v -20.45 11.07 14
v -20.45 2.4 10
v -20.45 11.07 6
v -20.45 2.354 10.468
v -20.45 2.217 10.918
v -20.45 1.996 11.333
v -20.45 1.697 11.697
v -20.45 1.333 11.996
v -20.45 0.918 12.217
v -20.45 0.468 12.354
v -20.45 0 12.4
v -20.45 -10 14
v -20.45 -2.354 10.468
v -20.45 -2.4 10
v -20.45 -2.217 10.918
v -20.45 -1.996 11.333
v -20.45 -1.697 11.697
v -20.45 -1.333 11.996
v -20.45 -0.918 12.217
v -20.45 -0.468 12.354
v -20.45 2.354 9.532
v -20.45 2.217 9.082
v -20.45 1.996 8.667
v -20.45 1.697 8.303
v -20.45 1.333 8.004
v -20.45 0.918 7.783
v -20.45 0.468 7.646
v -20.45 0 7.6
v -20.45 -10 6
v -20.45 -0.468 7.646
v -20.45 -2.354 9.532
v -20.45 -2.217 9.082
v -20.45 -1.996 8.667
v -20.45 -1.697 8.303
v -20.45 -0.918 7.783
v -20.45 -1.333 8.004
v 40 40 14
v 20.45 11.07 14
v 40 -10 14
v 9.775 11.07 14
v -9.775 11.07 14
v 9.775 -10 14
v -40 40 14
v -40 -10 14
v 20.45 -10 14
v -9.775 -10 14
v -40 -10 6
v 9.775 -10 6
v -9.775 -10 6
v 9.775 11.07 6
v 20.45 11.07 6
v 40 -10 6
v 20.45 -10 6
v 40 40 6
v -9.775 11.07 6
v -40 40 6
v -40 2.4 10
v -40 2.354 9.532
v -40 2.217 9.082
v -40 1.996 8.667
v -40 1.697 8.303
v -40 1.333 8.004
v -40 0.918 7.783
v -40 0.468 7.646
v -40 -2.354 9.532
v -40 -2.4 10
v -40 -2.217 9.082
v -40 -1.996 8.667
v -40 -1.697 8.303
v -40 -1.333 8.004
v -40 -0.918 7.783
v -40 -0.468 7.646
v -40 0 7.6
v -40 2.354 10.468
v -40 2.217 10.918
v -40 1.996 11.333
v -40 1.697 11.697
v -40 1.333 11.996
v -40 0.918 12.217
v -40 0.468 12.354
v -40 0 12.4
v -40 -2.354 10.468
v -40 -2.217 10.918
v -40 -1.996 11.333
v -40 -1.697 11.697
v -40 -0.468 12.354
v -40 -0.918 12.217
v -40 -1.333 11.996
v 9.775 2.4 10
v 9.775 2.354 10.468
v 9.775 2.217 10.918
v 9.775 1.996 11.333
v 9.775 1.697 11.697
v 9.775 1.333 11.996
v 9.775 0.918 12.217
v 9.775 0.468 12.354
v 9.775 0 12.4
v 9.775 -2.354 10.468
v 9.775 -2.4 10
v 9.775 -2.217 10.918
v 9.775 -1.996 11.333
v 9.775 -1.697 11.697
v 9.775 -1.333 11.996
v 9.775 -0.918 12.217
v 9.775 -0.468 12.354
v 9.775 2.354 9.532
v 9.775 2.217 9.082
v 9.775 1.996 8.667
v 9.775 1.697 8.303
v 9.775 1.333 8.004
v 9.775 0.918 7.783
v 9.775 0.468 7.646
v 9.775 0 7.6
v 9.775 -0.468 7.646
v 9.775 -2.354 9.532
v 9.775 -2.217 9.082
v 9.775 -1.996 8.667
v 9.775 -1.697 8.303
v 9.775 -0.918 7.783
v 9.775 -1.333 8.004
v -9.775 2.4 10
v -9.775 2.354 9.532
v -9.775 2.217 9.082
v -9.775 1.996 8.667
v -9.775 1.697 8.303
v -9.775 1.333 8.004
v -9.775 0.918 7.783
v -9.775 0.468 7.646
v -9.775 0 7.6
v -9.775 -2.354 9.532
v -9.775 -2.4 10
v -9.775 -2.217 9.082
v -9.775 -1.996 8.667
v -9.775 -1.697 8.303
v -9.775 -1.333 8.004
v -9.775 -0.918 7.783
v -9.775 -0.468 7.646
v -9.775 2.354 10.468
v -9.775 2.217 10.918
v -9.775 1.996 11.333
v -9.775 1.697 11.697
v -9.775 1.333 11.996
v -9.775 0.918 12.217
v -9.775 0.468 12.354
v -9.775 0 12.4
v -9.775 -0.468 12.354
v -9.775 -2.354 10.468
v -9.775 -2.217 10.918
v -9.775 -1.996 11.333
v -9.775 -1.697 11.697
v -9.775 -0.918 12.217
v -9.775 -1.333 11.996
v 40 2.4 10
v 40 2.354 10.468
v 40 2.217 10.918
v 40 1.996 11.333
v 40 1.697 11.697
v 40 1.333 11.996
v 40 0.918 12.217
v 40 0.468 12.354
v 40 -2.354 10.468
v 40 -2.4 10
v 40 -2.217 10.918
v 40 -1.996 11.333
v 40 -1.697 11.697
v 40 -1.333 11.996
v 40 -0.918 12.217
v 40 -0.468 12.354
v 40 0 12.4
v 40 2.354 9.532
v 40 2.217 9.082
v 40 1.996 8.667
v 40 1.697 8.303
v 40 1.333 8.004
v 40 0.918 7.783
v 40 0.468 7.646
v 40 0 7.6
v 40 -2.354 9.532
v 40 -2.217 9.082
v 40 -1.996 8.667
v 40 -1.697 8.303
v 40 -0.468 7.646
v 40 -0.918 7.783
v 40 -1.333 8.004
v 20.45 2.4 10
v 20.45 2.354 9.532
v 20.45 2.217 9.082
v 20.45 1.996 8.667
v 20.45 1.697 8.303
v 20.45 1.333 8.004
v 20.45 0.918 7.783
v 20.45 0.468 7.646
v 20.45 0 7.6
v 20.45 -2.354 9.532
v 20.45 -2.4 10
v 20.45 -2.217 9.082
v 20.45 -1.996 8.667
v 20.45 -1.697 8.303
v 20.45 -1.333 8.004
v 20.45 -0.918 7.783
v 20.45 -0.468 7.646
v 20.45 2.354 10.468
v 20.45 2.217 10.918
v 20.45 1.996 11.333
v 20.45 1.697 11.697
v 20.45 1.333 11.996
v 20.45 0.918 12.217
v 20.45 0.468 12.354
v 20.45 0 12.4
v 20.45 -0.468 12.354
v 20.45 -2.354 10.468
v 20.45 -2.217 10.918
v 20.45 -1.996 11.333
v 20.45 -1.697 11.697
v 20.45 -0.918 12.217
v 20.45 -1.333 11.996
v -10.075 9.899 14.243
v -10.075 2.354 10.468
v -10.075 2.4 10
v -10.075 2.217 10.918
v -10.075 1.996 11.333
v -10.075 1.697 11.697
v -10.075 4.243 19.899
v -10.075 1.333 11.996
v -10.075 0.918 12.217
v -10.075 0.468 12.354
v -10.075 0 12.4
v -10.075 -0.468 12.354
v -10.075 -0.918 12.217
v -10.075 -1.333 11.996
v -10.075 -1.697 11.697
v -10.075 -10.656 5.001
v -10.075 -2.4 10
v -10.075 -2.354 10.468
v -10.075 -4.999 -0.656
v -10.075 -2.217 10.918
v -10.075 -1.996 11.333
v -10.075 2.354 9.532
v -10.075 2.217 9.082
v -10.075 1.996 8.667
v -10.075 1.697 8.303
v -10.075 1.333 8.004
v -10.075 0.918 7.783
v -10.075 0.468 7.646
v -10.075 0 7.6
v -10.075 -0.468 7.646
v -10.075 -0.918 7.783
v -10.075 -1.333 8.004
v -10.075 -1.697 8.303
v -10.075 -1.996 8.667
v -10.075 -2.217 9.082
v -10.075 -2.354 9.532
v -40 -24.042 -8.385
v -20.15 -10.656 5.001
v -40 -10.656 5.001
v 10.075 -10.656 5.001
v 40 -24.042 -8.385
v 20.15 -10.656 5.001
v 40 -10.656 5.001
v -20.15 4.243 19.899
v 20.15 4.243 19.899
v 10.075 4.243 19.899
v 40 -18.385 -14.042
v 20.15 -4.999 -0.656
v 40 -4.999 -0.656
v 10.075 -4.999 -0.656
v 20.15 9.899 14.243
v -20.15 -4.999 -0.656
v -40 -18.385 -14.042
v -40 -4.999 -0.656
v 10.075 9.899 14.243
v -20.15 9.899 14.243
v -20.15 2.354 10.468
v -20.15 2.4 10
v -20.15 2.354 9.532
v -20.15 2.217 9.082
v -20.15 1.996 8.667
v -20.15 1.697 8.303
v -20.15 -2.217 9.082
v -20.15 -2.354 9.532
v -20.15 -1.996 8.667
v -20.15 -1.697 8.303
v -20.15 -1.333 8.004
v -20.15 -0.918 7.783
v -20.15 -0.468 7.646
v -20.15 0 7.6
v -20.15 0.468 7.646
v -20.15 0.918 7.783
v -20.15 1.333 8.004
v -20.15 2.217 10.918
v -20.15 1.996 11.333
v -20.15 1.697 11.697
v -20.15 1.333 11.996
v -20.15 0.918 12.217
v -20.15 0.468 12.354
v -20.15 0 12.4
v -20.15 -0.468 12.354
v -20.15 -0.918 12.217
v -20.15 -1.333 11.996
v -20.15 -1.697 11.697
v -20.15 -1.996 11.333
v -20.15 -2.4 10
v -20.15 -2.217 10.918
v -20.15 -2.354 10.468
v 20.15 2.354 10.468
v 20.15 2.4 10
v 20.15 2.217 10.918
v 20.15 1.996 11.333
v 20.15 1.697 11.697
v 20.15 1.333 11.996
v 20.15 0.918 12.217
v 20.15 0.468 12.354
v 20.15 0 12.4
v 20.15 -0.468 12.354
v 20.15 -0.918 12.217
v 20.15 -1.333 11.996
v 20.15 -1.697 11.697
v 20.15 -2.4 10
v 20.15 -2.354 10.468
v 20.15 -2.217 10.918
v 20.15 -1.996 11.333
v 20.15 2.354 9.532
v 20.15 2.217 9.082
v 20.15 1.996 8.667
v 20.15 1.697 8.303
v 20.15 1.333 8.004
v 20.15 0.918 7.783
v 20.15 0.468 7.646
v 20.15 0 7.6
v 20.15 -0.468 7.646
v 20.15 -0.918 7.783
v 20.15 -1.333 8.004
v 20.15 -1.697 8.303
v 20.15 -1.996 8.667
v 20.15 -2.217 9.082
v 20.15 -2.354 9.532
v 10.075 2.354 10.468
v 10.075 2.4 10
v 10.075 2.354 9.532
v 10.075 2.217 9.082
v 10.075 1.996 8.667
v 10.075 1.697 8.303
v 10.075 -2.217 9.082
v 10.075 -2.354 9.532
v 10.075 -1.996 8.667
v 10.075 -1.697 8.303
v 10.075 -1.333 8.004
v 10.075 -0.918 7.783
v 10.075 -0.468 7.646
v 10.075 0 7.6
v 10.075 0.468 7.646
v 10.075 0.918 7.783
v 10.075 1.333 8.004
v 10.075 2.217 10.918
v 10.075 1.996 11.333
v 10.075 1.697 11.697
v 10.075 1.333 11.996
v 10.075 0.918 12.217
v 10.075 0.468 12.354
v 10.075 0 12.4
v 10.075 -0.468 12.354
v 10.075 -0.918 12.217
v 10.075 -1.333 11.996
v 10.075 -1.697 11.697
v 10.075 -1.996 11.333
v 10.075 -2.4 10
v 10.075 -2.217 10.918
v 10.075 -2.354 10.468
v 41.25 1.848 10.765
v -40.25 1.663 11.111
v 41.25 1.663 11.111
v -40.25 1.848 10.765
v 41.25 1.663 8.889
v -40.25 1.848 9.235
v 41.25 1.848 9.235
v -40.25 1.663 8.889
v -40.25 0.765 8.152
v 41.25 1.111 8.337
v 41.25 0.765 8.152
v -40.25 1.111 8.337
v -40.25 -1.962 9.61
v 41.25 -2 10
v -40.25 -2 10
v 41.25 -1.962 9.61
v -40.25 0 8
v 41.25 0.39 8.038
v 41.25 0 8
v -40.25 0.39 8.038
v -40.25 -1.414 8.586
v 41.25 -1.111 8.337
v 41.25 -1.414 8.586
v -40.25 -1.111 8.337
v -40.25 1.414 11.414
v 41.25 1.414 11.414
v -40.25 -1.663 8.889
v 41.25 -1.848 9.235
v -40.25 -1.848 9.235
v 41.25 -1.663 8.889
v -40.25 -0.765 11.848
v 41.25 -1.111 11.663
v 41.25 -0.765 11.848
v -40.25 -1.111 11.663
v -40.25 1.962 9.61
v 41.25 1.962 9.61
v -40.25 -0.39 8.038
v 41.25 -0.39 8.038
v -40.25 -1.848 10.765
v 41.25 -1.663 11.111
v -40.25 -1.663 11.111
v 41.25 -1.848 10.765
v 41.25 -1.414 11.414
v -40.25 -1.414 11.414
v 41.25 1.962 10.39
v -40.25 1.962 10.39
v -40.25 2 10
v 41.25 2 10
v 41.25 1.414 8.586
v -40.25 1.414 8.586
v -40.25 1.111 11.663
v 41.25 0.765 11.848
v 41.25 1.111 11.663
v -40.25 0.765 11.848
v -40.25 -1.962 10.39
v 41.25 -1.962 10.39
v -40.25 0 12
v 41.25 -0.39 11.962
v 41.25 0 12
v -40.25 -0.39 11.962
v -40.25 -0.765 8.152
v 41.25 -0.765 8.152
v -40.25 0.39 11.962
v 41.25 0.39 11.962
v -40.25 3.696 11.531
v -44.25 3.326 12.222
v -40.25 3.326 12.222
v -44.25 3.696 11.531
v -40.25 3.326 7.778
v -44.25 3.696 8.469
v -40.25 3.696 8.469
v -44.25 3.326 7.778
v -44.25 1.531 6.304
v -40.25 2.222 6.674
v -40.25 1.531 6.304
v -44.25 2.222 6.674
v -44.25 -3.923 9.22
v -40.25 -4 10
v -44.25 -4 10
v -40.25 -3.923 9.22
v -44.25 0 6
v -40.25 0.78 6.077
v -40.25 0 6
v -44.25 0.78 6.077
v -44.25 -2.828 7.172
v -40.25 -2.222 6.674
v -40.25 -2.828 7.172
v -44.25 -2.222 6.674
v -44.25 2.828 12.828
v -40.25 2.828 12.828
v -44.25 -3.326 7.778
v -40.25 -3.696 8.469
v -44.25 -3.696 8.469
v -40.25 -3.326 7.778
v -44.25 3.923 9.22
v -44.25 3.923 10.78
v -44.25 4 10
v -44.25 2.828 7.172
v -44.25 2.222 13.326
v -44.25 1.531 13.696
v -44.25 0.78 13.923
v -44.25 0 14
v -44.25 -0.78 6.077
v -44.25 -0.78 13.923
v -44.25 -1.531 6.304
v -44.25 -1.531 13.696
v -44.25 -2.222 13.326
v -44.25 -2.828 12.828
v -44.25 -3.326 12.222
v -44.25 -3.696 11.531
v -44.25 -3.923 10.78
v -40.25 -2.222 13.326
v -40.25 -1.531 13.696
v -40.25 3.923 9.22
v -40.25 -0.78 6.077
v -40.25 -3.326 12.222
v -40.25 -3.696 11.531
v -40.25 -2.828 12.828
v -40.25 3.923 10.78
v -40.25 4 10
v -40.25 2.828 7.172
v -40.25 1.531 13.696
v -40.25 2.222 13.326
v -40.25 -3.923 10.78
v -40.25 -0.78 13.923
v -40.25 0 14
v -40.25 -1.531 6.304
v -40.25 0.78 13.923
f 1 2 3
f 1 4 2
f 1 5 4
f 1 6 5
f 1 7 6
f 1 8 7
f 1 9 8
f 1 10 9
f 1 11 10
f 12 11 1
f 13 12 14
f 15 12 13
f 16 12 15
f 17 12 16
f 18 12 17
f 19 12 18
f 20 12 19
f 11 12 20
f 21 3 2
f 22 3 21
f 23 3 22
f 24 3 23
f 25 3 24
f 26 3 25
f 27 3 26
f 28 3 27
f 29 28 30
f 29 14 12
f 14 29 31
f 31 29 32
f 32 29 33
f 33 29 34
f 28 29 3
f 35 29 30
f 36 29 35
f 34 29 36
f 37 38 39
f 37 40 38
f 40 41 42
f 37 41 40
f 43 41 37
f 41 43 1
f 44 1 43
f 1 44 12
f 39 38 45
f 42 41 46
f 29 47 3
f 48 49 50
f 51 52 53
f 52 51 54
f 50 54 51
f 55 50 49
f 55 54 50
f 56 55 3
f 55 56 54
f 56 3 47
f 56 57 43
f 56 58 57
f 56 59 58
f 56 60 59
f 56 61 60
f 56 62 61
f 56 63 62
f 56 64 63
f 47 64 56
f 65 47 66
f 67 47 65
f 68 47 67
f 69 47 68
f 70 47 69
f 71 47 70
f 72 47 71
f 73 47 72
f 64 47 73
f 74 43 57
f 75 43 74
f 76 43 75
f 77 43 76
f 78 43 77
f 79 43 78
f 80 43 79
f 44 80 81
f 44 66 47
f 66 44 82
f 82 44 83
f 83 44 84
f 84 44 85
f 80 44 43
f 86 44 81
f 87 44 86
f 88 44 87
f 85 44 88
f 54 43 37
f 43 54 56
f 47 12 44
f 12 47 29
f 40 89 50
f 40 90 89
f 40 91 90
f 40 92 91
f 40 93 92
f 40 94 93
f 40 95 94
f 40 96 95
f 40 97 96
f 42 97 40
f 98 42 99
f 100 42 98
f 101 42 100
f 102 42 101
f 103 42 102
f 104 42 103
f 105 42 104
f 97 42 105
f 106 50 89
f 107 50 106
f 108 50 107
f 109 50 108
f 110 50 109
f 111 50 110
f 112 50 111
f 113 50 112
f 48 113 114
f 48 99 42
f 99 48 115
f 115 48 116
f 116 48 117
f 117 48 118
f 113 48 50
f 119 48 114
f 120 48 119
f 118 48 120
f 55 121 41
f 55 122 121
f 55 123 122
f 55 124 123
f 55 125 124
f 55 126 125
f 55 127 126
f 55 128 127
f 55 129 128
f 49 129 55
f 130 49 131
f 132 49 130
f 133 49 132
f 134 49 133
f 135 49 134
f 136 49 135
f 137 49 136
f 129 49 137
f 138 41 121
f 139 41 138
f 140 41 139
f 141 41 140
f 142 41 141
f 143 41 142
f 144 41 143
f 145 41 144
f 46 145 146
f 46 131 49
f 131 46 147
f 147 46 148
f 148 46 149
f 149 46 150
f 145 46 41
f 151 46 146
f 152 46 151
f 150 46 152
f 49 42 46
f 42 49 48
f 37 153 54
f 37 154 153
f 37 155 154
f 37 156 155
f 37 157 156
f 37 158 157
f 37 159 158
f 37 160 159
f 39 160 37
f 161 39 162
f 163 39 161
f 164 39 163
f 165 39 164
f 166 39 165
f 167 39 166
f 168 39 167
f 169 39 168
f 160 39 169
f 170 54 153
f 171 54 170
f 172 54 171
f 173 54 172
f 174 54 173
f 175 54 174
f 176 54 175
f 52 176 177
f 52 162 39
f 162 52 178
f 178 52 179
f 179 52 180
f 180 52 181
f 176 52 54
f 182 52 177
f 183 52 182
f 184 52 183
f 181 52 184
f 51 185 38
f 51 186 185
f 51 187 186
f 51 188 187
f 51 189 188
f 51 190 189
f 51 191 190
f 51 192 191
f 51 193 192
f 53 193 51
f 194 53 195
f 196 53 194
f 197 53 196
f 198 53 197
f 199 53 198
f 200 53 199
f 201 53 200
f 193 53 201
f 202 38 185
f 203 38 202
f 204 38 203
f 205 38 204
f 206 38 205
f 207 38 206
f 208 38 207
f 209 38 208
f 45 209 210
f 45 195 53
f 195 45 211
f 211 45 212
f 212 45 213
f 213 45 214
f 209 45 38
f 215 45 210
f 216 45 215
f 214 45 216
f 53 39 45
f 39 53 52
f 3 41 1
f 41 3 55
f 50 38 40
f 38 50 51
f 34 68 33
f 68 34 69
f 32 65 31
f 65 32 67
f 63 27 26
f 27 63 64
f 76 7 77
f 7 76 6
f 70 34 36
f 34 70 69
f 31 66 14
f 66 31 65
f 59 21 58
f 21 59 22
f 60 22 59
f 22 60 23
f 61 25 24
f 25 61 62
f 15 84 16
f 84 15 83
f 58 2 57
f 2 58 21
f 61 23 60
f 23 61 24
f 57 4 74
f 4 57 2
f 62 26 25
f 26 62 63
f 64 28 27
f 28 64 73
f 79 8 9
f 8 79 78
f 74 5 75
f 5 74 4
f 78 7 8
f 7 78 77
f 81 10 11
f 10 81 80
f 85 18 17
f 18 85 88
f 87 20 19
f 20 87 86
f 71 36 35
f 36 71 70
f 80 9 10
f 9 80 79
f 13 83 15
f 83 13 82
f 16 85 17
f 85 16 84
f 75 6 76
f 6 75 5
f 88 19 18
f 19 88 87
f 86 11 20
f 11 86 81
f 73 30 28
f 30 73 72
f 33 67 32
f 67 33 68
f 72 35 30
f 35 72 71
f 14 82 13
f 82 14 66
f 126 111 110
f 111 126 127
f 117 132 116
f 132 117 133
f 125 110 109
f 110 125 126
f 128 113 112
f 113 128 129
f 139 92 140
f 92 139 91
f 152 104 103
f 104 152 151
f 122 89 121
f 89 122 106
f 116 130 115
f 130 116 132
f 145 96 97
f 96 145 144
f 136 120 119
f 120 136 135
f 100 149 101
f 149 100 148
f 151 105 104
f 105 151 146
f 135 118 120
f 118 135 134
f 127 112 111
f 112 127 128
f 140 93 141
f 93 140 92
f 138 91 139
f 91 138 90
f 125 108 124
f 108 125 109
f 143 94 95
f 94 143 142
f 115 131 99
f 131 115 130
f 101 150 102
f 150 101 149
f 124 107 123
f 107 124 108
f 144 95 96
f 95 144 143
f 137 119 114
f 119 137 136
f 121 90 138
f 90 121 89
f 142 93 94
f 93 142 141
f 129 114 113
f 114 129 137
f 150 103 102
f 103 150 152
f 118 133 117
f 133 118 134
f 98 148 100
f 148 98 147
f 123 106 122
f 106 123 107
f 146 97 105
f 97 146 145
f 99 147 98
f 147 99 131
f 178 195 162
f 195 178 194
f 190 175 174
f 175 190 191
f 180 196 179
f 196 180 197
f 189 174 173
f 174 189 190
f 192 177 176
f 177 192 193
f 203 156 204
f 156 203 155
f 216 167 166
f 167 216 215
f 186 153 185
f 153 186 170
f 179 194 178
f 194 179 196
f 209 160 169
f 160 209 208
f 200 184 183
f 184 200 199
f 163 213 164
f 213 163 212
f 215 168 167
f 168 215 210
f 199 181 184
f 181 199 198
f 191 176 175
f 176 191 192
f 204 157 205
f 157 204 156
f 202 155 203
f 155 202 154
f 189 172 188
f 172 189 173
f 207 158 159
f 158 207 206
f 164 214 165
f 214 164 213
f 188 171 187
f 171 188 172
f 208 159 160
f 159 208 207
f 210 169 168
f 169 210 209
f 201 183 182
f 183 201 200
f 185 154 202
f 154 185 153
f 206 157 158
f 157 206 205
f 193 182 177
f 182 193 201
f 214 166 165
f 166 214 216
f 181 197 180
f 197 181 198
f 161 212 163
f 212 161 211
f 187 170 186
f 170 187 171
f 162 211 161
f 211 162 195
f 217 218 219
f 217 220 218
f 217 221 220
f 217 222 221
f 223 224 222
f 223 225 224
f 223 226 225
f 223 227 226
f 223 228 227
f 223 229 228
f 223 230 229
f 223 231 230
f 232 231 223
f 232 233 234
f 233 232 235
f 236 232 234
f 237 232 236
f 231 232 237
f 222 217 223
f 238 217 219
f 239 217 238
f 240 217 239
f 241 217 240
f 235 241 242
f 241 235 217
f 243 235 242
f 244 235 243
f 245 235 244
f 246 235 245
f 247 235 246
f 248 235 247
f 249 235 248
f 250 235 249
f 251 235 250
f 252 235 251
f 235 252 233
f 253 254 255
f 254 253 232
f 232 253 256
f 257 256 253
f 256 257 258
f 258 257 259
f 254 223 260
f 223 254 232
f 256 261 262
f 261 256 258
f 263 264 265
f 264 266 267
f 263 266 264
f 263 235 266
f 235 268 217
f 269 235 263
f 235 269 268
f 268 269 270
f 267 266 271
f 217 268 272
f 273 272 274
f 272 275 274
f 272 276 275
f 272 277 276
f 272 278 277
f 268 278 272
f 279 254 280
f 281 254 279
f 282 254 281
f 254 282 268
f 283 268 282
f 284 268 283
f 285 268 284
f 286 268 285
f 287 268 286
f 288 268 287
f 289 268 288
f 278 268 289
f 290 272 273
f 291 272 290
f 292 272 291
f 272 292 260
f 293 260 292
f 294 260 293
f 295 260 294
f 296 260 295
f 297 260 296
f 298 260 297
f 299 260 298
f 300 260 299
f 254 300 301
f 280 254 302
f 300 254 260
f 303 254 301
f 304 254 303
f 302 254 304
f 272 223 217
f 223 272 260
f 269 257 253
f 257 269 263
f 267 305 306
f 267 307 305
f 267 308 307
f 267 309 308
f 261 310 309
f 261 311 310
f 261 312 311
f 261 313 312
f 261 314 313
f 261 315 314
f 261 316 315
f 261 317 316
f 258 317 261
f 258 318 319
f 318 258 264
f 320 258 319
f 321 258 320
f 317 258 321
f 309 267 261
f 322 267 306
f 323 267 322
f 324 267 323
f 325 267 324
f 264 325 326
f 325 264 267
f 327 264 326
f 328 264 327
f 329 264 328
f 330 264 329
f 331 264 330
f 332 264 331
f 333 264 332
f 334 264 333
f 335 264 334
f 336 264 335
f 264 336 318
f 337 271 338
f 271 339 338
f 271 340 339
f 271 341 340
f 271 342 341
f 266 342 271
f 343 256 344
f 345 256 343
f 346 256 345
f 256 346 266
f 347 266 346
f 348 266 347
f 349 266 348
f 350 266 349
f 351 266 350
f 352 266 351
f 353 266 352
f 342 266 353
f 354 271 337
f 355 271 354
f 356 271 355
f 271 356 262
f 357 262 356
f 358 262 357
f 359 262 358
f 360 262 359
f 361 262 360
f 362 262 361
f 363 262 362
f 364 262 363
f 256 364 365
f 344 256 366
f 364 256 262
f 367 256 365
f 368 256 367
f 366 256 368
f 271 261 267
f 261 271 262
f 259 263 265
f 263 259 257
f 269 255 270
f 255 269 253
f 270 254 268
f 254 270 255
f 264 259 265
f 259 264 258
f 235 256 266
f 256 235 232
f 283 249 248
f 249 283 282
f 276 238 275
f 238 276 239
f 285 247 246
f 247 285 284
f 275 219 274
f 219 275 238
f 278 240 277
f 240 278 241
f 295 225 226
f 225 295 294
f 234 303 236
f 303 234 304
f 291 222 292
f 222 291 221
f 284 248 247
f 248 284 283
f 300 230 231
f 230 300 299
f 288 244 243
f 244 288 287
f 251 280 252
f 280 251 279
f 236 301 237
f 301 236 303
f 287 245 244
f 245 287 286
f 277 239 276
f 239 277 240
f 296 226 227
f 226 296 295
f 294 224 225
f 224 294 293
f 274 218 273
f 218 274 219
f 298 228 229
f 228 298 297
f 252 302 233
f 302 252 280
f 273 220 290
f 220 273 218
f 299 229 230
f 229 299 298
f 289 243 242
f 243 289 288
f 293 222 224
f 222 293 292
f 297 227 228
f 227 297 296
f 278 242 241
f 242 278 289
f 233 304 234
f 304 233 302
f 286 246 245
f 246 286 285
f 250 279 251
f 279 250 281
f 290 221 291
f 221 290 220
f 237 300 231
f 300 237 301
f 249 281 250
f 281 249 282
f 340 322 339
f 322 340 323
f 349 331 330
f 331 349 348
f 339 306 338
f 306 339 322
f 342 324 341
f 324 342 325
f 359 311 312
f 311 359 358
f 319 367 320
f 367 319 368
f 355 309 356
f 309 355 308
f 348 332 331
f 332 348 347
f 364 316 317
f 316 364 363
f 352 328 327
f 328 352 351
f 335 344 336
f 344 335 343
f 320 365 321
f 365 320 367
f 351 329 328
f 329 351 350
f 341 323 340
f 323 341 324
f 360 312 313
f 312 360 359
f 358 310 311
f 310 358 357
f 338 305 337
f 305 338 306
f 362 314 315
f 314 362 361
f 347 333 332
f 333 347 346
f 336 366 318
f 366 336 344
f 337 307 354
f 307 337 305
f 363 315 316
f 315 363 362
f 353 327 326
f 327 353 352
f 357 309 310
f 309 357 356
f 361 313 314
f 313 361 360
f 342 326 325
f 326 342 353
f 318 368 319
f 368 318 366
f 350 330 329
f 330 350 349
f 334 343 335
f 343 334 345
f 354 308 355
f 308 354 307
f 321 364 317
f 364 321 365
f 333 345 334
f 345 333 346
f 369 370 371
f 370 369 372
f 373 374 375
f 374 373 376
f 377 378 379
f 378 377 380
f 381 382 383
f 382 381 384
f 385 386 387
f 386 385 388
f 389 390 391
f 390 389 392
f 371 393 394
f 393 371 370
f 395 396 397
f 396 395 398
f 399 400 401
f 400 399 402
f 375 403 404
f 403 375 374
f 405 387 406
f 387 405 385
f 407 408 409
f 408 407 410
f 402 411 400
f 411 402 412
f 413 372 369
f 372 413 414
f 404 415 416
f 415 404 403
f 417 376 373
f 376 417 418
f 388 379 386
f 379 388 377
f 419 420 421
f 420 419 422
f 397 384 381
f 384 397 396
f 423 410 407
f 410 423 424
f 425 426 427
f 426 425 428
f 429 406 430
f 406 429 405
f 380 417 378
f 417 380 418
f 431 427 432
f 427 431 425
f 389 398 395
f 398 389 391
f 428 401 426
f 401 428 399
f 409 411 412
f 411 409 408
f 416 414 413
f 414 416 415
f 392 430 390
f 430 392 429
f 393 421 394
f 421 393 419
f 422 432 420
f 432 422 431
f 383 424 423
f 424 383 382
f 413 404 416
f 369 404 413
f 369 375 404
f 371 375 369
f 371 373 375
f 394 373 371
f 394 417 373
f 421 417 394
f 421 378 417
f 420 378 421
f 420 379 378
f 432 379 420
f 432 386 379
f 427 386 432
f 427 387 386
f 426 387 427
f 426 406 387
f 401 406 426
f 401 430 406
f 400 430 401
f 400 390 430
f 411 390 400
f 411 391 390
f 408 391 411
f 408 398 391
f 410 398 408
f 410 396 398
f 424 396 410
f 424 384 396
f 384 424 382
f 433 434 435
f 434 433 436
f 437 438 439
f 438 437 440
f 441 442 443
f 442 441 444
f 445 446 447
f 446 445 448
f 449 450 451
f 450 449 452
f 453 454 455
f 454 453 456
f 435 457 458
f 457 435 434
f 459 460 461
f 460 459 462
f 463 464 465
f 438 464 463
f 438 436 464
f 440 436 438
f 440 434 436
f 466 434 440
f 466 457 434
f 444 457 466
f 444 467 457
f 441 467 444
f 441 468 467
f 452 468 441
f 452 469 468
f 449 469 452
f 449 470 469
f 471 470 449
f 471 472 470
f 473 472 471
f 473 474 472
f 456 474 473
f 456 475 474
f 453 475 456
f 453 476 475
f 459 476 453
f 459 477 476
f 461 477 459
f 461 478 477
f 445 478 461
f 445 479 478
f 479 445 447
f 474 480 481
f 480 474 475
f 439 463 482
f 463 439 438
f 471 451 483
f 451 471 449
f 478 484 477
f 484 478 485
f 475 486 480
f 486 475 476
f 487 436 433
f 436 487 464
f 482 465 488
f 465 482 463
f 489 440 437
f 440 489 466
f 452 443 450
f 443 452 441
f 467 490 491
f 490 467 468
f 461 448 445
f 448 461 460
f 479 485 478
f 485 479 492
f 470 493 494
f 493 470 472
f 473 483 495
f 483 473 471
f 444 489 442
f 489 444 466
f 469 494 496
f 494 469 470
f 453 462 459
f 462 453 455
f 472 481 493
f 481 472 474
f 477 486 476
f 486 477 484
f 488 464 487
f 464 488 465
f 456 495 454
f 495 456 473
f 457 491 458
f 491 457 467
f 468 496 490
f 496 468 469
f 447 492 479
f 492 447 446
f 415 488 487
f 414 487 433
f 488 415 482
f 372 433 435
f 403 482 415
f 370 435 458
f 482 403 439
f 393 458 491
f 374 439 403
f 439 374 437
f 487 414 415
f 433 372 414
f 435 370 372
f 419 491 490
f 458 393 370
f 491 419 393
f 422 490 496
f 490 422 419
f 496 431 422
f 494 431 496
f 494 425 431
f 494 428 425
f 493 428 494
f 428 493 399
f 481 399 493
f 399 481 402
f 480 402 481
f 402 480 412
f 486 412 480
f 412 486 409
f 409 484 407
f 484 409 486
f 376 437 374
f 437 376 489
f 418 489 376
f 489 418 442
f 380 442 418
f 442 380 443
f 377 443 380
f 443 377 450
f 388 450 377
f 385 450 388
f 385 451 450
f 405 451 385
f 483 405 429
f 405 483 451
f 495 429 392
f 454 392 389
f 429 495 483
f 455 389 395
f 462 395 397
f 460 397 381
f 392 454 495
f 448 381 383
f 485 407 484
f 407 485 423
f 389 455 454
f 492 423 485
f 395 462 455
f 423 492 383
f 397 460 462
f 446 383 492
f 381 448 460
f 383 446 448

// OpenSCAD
$fn = 32;

// ------------------------------------------------------------------------
// Butt hinge: hinge 80 mm, leaf swung 45 deg
// Every part is its own module, assembly() places every instance.
// ------------------------------------------------------------------------

// --- part 1 ---
module hinge_base() {
  difference() {
    union() {
      translate([-40, -10, -4]) cube([19.55, 50, 8]);
      translate([-9.775, -10, -4]) cube([19.55, 50, 8]);
      translate([20.45, -10, -4]) cube([19.55, 50, 8]);
      translate([-40, 11.07, -4]) cube([80, 28.93, 8]);
    }
    translate([-30.225, 0, 0]) rotate([0, 90, 0]) cylinder(h = 21.55, d = 4.8, center = true);
    translate([0, 0, 0]) rotate([0, 90, 0]) cylinder(h = 21.55, d = 4.8, center = true);
    translate([30.225, 0, 0]) rotate([0, 90, 0]) cylinder(h = 21.55, d = 4.8, center = true);
  }
}

// --- part 2 ---
module hinge_mover() {
  difference() {
    union() {
      translate([-20.15, -30, -4]) cube([10.075, 40, 8]);
      translate([10.075, -30, -4]) cube([10.075, 40, 8]);
      translate([-40, -30, -4]) cube([80, 18.93, 8]);
    }
    translate([-15.113, 0, 0]) rotate([0, 90, 0]) cylinder(h = 12.075, d = 4.8, center = true);
    translate([15.113, 0, 0]) rotate([0, 90, 0]) cylinder(h = 12.075, d = 4.8, center = true);
  }
}

// --- part 3 ---
module hinge_pin() {
  rotate([0, 90, 0]) cylinder(h = 82.5, d = 4, center = true);
  translate([-44.25, 0, 0]) rotate([0, 90, 0]) cylinder(h = 4, d = 8);
}

// --- assembly ---
module assembly() {
  color([0.80, 0.24, 0.20]) translate([0, 0, 10]) rotate([0, 0, 0]) hinge_base();
  color([0.20, 0.45, 0.75]) translate([0, 0, 10]) rotate([45, 0, 0]) hinge_mover();
  color([0.25, 0.62, 0.32]) translate([0, 0, 10]) rotate([0, 0, 0]) hinge_pin();
}

assembly();
